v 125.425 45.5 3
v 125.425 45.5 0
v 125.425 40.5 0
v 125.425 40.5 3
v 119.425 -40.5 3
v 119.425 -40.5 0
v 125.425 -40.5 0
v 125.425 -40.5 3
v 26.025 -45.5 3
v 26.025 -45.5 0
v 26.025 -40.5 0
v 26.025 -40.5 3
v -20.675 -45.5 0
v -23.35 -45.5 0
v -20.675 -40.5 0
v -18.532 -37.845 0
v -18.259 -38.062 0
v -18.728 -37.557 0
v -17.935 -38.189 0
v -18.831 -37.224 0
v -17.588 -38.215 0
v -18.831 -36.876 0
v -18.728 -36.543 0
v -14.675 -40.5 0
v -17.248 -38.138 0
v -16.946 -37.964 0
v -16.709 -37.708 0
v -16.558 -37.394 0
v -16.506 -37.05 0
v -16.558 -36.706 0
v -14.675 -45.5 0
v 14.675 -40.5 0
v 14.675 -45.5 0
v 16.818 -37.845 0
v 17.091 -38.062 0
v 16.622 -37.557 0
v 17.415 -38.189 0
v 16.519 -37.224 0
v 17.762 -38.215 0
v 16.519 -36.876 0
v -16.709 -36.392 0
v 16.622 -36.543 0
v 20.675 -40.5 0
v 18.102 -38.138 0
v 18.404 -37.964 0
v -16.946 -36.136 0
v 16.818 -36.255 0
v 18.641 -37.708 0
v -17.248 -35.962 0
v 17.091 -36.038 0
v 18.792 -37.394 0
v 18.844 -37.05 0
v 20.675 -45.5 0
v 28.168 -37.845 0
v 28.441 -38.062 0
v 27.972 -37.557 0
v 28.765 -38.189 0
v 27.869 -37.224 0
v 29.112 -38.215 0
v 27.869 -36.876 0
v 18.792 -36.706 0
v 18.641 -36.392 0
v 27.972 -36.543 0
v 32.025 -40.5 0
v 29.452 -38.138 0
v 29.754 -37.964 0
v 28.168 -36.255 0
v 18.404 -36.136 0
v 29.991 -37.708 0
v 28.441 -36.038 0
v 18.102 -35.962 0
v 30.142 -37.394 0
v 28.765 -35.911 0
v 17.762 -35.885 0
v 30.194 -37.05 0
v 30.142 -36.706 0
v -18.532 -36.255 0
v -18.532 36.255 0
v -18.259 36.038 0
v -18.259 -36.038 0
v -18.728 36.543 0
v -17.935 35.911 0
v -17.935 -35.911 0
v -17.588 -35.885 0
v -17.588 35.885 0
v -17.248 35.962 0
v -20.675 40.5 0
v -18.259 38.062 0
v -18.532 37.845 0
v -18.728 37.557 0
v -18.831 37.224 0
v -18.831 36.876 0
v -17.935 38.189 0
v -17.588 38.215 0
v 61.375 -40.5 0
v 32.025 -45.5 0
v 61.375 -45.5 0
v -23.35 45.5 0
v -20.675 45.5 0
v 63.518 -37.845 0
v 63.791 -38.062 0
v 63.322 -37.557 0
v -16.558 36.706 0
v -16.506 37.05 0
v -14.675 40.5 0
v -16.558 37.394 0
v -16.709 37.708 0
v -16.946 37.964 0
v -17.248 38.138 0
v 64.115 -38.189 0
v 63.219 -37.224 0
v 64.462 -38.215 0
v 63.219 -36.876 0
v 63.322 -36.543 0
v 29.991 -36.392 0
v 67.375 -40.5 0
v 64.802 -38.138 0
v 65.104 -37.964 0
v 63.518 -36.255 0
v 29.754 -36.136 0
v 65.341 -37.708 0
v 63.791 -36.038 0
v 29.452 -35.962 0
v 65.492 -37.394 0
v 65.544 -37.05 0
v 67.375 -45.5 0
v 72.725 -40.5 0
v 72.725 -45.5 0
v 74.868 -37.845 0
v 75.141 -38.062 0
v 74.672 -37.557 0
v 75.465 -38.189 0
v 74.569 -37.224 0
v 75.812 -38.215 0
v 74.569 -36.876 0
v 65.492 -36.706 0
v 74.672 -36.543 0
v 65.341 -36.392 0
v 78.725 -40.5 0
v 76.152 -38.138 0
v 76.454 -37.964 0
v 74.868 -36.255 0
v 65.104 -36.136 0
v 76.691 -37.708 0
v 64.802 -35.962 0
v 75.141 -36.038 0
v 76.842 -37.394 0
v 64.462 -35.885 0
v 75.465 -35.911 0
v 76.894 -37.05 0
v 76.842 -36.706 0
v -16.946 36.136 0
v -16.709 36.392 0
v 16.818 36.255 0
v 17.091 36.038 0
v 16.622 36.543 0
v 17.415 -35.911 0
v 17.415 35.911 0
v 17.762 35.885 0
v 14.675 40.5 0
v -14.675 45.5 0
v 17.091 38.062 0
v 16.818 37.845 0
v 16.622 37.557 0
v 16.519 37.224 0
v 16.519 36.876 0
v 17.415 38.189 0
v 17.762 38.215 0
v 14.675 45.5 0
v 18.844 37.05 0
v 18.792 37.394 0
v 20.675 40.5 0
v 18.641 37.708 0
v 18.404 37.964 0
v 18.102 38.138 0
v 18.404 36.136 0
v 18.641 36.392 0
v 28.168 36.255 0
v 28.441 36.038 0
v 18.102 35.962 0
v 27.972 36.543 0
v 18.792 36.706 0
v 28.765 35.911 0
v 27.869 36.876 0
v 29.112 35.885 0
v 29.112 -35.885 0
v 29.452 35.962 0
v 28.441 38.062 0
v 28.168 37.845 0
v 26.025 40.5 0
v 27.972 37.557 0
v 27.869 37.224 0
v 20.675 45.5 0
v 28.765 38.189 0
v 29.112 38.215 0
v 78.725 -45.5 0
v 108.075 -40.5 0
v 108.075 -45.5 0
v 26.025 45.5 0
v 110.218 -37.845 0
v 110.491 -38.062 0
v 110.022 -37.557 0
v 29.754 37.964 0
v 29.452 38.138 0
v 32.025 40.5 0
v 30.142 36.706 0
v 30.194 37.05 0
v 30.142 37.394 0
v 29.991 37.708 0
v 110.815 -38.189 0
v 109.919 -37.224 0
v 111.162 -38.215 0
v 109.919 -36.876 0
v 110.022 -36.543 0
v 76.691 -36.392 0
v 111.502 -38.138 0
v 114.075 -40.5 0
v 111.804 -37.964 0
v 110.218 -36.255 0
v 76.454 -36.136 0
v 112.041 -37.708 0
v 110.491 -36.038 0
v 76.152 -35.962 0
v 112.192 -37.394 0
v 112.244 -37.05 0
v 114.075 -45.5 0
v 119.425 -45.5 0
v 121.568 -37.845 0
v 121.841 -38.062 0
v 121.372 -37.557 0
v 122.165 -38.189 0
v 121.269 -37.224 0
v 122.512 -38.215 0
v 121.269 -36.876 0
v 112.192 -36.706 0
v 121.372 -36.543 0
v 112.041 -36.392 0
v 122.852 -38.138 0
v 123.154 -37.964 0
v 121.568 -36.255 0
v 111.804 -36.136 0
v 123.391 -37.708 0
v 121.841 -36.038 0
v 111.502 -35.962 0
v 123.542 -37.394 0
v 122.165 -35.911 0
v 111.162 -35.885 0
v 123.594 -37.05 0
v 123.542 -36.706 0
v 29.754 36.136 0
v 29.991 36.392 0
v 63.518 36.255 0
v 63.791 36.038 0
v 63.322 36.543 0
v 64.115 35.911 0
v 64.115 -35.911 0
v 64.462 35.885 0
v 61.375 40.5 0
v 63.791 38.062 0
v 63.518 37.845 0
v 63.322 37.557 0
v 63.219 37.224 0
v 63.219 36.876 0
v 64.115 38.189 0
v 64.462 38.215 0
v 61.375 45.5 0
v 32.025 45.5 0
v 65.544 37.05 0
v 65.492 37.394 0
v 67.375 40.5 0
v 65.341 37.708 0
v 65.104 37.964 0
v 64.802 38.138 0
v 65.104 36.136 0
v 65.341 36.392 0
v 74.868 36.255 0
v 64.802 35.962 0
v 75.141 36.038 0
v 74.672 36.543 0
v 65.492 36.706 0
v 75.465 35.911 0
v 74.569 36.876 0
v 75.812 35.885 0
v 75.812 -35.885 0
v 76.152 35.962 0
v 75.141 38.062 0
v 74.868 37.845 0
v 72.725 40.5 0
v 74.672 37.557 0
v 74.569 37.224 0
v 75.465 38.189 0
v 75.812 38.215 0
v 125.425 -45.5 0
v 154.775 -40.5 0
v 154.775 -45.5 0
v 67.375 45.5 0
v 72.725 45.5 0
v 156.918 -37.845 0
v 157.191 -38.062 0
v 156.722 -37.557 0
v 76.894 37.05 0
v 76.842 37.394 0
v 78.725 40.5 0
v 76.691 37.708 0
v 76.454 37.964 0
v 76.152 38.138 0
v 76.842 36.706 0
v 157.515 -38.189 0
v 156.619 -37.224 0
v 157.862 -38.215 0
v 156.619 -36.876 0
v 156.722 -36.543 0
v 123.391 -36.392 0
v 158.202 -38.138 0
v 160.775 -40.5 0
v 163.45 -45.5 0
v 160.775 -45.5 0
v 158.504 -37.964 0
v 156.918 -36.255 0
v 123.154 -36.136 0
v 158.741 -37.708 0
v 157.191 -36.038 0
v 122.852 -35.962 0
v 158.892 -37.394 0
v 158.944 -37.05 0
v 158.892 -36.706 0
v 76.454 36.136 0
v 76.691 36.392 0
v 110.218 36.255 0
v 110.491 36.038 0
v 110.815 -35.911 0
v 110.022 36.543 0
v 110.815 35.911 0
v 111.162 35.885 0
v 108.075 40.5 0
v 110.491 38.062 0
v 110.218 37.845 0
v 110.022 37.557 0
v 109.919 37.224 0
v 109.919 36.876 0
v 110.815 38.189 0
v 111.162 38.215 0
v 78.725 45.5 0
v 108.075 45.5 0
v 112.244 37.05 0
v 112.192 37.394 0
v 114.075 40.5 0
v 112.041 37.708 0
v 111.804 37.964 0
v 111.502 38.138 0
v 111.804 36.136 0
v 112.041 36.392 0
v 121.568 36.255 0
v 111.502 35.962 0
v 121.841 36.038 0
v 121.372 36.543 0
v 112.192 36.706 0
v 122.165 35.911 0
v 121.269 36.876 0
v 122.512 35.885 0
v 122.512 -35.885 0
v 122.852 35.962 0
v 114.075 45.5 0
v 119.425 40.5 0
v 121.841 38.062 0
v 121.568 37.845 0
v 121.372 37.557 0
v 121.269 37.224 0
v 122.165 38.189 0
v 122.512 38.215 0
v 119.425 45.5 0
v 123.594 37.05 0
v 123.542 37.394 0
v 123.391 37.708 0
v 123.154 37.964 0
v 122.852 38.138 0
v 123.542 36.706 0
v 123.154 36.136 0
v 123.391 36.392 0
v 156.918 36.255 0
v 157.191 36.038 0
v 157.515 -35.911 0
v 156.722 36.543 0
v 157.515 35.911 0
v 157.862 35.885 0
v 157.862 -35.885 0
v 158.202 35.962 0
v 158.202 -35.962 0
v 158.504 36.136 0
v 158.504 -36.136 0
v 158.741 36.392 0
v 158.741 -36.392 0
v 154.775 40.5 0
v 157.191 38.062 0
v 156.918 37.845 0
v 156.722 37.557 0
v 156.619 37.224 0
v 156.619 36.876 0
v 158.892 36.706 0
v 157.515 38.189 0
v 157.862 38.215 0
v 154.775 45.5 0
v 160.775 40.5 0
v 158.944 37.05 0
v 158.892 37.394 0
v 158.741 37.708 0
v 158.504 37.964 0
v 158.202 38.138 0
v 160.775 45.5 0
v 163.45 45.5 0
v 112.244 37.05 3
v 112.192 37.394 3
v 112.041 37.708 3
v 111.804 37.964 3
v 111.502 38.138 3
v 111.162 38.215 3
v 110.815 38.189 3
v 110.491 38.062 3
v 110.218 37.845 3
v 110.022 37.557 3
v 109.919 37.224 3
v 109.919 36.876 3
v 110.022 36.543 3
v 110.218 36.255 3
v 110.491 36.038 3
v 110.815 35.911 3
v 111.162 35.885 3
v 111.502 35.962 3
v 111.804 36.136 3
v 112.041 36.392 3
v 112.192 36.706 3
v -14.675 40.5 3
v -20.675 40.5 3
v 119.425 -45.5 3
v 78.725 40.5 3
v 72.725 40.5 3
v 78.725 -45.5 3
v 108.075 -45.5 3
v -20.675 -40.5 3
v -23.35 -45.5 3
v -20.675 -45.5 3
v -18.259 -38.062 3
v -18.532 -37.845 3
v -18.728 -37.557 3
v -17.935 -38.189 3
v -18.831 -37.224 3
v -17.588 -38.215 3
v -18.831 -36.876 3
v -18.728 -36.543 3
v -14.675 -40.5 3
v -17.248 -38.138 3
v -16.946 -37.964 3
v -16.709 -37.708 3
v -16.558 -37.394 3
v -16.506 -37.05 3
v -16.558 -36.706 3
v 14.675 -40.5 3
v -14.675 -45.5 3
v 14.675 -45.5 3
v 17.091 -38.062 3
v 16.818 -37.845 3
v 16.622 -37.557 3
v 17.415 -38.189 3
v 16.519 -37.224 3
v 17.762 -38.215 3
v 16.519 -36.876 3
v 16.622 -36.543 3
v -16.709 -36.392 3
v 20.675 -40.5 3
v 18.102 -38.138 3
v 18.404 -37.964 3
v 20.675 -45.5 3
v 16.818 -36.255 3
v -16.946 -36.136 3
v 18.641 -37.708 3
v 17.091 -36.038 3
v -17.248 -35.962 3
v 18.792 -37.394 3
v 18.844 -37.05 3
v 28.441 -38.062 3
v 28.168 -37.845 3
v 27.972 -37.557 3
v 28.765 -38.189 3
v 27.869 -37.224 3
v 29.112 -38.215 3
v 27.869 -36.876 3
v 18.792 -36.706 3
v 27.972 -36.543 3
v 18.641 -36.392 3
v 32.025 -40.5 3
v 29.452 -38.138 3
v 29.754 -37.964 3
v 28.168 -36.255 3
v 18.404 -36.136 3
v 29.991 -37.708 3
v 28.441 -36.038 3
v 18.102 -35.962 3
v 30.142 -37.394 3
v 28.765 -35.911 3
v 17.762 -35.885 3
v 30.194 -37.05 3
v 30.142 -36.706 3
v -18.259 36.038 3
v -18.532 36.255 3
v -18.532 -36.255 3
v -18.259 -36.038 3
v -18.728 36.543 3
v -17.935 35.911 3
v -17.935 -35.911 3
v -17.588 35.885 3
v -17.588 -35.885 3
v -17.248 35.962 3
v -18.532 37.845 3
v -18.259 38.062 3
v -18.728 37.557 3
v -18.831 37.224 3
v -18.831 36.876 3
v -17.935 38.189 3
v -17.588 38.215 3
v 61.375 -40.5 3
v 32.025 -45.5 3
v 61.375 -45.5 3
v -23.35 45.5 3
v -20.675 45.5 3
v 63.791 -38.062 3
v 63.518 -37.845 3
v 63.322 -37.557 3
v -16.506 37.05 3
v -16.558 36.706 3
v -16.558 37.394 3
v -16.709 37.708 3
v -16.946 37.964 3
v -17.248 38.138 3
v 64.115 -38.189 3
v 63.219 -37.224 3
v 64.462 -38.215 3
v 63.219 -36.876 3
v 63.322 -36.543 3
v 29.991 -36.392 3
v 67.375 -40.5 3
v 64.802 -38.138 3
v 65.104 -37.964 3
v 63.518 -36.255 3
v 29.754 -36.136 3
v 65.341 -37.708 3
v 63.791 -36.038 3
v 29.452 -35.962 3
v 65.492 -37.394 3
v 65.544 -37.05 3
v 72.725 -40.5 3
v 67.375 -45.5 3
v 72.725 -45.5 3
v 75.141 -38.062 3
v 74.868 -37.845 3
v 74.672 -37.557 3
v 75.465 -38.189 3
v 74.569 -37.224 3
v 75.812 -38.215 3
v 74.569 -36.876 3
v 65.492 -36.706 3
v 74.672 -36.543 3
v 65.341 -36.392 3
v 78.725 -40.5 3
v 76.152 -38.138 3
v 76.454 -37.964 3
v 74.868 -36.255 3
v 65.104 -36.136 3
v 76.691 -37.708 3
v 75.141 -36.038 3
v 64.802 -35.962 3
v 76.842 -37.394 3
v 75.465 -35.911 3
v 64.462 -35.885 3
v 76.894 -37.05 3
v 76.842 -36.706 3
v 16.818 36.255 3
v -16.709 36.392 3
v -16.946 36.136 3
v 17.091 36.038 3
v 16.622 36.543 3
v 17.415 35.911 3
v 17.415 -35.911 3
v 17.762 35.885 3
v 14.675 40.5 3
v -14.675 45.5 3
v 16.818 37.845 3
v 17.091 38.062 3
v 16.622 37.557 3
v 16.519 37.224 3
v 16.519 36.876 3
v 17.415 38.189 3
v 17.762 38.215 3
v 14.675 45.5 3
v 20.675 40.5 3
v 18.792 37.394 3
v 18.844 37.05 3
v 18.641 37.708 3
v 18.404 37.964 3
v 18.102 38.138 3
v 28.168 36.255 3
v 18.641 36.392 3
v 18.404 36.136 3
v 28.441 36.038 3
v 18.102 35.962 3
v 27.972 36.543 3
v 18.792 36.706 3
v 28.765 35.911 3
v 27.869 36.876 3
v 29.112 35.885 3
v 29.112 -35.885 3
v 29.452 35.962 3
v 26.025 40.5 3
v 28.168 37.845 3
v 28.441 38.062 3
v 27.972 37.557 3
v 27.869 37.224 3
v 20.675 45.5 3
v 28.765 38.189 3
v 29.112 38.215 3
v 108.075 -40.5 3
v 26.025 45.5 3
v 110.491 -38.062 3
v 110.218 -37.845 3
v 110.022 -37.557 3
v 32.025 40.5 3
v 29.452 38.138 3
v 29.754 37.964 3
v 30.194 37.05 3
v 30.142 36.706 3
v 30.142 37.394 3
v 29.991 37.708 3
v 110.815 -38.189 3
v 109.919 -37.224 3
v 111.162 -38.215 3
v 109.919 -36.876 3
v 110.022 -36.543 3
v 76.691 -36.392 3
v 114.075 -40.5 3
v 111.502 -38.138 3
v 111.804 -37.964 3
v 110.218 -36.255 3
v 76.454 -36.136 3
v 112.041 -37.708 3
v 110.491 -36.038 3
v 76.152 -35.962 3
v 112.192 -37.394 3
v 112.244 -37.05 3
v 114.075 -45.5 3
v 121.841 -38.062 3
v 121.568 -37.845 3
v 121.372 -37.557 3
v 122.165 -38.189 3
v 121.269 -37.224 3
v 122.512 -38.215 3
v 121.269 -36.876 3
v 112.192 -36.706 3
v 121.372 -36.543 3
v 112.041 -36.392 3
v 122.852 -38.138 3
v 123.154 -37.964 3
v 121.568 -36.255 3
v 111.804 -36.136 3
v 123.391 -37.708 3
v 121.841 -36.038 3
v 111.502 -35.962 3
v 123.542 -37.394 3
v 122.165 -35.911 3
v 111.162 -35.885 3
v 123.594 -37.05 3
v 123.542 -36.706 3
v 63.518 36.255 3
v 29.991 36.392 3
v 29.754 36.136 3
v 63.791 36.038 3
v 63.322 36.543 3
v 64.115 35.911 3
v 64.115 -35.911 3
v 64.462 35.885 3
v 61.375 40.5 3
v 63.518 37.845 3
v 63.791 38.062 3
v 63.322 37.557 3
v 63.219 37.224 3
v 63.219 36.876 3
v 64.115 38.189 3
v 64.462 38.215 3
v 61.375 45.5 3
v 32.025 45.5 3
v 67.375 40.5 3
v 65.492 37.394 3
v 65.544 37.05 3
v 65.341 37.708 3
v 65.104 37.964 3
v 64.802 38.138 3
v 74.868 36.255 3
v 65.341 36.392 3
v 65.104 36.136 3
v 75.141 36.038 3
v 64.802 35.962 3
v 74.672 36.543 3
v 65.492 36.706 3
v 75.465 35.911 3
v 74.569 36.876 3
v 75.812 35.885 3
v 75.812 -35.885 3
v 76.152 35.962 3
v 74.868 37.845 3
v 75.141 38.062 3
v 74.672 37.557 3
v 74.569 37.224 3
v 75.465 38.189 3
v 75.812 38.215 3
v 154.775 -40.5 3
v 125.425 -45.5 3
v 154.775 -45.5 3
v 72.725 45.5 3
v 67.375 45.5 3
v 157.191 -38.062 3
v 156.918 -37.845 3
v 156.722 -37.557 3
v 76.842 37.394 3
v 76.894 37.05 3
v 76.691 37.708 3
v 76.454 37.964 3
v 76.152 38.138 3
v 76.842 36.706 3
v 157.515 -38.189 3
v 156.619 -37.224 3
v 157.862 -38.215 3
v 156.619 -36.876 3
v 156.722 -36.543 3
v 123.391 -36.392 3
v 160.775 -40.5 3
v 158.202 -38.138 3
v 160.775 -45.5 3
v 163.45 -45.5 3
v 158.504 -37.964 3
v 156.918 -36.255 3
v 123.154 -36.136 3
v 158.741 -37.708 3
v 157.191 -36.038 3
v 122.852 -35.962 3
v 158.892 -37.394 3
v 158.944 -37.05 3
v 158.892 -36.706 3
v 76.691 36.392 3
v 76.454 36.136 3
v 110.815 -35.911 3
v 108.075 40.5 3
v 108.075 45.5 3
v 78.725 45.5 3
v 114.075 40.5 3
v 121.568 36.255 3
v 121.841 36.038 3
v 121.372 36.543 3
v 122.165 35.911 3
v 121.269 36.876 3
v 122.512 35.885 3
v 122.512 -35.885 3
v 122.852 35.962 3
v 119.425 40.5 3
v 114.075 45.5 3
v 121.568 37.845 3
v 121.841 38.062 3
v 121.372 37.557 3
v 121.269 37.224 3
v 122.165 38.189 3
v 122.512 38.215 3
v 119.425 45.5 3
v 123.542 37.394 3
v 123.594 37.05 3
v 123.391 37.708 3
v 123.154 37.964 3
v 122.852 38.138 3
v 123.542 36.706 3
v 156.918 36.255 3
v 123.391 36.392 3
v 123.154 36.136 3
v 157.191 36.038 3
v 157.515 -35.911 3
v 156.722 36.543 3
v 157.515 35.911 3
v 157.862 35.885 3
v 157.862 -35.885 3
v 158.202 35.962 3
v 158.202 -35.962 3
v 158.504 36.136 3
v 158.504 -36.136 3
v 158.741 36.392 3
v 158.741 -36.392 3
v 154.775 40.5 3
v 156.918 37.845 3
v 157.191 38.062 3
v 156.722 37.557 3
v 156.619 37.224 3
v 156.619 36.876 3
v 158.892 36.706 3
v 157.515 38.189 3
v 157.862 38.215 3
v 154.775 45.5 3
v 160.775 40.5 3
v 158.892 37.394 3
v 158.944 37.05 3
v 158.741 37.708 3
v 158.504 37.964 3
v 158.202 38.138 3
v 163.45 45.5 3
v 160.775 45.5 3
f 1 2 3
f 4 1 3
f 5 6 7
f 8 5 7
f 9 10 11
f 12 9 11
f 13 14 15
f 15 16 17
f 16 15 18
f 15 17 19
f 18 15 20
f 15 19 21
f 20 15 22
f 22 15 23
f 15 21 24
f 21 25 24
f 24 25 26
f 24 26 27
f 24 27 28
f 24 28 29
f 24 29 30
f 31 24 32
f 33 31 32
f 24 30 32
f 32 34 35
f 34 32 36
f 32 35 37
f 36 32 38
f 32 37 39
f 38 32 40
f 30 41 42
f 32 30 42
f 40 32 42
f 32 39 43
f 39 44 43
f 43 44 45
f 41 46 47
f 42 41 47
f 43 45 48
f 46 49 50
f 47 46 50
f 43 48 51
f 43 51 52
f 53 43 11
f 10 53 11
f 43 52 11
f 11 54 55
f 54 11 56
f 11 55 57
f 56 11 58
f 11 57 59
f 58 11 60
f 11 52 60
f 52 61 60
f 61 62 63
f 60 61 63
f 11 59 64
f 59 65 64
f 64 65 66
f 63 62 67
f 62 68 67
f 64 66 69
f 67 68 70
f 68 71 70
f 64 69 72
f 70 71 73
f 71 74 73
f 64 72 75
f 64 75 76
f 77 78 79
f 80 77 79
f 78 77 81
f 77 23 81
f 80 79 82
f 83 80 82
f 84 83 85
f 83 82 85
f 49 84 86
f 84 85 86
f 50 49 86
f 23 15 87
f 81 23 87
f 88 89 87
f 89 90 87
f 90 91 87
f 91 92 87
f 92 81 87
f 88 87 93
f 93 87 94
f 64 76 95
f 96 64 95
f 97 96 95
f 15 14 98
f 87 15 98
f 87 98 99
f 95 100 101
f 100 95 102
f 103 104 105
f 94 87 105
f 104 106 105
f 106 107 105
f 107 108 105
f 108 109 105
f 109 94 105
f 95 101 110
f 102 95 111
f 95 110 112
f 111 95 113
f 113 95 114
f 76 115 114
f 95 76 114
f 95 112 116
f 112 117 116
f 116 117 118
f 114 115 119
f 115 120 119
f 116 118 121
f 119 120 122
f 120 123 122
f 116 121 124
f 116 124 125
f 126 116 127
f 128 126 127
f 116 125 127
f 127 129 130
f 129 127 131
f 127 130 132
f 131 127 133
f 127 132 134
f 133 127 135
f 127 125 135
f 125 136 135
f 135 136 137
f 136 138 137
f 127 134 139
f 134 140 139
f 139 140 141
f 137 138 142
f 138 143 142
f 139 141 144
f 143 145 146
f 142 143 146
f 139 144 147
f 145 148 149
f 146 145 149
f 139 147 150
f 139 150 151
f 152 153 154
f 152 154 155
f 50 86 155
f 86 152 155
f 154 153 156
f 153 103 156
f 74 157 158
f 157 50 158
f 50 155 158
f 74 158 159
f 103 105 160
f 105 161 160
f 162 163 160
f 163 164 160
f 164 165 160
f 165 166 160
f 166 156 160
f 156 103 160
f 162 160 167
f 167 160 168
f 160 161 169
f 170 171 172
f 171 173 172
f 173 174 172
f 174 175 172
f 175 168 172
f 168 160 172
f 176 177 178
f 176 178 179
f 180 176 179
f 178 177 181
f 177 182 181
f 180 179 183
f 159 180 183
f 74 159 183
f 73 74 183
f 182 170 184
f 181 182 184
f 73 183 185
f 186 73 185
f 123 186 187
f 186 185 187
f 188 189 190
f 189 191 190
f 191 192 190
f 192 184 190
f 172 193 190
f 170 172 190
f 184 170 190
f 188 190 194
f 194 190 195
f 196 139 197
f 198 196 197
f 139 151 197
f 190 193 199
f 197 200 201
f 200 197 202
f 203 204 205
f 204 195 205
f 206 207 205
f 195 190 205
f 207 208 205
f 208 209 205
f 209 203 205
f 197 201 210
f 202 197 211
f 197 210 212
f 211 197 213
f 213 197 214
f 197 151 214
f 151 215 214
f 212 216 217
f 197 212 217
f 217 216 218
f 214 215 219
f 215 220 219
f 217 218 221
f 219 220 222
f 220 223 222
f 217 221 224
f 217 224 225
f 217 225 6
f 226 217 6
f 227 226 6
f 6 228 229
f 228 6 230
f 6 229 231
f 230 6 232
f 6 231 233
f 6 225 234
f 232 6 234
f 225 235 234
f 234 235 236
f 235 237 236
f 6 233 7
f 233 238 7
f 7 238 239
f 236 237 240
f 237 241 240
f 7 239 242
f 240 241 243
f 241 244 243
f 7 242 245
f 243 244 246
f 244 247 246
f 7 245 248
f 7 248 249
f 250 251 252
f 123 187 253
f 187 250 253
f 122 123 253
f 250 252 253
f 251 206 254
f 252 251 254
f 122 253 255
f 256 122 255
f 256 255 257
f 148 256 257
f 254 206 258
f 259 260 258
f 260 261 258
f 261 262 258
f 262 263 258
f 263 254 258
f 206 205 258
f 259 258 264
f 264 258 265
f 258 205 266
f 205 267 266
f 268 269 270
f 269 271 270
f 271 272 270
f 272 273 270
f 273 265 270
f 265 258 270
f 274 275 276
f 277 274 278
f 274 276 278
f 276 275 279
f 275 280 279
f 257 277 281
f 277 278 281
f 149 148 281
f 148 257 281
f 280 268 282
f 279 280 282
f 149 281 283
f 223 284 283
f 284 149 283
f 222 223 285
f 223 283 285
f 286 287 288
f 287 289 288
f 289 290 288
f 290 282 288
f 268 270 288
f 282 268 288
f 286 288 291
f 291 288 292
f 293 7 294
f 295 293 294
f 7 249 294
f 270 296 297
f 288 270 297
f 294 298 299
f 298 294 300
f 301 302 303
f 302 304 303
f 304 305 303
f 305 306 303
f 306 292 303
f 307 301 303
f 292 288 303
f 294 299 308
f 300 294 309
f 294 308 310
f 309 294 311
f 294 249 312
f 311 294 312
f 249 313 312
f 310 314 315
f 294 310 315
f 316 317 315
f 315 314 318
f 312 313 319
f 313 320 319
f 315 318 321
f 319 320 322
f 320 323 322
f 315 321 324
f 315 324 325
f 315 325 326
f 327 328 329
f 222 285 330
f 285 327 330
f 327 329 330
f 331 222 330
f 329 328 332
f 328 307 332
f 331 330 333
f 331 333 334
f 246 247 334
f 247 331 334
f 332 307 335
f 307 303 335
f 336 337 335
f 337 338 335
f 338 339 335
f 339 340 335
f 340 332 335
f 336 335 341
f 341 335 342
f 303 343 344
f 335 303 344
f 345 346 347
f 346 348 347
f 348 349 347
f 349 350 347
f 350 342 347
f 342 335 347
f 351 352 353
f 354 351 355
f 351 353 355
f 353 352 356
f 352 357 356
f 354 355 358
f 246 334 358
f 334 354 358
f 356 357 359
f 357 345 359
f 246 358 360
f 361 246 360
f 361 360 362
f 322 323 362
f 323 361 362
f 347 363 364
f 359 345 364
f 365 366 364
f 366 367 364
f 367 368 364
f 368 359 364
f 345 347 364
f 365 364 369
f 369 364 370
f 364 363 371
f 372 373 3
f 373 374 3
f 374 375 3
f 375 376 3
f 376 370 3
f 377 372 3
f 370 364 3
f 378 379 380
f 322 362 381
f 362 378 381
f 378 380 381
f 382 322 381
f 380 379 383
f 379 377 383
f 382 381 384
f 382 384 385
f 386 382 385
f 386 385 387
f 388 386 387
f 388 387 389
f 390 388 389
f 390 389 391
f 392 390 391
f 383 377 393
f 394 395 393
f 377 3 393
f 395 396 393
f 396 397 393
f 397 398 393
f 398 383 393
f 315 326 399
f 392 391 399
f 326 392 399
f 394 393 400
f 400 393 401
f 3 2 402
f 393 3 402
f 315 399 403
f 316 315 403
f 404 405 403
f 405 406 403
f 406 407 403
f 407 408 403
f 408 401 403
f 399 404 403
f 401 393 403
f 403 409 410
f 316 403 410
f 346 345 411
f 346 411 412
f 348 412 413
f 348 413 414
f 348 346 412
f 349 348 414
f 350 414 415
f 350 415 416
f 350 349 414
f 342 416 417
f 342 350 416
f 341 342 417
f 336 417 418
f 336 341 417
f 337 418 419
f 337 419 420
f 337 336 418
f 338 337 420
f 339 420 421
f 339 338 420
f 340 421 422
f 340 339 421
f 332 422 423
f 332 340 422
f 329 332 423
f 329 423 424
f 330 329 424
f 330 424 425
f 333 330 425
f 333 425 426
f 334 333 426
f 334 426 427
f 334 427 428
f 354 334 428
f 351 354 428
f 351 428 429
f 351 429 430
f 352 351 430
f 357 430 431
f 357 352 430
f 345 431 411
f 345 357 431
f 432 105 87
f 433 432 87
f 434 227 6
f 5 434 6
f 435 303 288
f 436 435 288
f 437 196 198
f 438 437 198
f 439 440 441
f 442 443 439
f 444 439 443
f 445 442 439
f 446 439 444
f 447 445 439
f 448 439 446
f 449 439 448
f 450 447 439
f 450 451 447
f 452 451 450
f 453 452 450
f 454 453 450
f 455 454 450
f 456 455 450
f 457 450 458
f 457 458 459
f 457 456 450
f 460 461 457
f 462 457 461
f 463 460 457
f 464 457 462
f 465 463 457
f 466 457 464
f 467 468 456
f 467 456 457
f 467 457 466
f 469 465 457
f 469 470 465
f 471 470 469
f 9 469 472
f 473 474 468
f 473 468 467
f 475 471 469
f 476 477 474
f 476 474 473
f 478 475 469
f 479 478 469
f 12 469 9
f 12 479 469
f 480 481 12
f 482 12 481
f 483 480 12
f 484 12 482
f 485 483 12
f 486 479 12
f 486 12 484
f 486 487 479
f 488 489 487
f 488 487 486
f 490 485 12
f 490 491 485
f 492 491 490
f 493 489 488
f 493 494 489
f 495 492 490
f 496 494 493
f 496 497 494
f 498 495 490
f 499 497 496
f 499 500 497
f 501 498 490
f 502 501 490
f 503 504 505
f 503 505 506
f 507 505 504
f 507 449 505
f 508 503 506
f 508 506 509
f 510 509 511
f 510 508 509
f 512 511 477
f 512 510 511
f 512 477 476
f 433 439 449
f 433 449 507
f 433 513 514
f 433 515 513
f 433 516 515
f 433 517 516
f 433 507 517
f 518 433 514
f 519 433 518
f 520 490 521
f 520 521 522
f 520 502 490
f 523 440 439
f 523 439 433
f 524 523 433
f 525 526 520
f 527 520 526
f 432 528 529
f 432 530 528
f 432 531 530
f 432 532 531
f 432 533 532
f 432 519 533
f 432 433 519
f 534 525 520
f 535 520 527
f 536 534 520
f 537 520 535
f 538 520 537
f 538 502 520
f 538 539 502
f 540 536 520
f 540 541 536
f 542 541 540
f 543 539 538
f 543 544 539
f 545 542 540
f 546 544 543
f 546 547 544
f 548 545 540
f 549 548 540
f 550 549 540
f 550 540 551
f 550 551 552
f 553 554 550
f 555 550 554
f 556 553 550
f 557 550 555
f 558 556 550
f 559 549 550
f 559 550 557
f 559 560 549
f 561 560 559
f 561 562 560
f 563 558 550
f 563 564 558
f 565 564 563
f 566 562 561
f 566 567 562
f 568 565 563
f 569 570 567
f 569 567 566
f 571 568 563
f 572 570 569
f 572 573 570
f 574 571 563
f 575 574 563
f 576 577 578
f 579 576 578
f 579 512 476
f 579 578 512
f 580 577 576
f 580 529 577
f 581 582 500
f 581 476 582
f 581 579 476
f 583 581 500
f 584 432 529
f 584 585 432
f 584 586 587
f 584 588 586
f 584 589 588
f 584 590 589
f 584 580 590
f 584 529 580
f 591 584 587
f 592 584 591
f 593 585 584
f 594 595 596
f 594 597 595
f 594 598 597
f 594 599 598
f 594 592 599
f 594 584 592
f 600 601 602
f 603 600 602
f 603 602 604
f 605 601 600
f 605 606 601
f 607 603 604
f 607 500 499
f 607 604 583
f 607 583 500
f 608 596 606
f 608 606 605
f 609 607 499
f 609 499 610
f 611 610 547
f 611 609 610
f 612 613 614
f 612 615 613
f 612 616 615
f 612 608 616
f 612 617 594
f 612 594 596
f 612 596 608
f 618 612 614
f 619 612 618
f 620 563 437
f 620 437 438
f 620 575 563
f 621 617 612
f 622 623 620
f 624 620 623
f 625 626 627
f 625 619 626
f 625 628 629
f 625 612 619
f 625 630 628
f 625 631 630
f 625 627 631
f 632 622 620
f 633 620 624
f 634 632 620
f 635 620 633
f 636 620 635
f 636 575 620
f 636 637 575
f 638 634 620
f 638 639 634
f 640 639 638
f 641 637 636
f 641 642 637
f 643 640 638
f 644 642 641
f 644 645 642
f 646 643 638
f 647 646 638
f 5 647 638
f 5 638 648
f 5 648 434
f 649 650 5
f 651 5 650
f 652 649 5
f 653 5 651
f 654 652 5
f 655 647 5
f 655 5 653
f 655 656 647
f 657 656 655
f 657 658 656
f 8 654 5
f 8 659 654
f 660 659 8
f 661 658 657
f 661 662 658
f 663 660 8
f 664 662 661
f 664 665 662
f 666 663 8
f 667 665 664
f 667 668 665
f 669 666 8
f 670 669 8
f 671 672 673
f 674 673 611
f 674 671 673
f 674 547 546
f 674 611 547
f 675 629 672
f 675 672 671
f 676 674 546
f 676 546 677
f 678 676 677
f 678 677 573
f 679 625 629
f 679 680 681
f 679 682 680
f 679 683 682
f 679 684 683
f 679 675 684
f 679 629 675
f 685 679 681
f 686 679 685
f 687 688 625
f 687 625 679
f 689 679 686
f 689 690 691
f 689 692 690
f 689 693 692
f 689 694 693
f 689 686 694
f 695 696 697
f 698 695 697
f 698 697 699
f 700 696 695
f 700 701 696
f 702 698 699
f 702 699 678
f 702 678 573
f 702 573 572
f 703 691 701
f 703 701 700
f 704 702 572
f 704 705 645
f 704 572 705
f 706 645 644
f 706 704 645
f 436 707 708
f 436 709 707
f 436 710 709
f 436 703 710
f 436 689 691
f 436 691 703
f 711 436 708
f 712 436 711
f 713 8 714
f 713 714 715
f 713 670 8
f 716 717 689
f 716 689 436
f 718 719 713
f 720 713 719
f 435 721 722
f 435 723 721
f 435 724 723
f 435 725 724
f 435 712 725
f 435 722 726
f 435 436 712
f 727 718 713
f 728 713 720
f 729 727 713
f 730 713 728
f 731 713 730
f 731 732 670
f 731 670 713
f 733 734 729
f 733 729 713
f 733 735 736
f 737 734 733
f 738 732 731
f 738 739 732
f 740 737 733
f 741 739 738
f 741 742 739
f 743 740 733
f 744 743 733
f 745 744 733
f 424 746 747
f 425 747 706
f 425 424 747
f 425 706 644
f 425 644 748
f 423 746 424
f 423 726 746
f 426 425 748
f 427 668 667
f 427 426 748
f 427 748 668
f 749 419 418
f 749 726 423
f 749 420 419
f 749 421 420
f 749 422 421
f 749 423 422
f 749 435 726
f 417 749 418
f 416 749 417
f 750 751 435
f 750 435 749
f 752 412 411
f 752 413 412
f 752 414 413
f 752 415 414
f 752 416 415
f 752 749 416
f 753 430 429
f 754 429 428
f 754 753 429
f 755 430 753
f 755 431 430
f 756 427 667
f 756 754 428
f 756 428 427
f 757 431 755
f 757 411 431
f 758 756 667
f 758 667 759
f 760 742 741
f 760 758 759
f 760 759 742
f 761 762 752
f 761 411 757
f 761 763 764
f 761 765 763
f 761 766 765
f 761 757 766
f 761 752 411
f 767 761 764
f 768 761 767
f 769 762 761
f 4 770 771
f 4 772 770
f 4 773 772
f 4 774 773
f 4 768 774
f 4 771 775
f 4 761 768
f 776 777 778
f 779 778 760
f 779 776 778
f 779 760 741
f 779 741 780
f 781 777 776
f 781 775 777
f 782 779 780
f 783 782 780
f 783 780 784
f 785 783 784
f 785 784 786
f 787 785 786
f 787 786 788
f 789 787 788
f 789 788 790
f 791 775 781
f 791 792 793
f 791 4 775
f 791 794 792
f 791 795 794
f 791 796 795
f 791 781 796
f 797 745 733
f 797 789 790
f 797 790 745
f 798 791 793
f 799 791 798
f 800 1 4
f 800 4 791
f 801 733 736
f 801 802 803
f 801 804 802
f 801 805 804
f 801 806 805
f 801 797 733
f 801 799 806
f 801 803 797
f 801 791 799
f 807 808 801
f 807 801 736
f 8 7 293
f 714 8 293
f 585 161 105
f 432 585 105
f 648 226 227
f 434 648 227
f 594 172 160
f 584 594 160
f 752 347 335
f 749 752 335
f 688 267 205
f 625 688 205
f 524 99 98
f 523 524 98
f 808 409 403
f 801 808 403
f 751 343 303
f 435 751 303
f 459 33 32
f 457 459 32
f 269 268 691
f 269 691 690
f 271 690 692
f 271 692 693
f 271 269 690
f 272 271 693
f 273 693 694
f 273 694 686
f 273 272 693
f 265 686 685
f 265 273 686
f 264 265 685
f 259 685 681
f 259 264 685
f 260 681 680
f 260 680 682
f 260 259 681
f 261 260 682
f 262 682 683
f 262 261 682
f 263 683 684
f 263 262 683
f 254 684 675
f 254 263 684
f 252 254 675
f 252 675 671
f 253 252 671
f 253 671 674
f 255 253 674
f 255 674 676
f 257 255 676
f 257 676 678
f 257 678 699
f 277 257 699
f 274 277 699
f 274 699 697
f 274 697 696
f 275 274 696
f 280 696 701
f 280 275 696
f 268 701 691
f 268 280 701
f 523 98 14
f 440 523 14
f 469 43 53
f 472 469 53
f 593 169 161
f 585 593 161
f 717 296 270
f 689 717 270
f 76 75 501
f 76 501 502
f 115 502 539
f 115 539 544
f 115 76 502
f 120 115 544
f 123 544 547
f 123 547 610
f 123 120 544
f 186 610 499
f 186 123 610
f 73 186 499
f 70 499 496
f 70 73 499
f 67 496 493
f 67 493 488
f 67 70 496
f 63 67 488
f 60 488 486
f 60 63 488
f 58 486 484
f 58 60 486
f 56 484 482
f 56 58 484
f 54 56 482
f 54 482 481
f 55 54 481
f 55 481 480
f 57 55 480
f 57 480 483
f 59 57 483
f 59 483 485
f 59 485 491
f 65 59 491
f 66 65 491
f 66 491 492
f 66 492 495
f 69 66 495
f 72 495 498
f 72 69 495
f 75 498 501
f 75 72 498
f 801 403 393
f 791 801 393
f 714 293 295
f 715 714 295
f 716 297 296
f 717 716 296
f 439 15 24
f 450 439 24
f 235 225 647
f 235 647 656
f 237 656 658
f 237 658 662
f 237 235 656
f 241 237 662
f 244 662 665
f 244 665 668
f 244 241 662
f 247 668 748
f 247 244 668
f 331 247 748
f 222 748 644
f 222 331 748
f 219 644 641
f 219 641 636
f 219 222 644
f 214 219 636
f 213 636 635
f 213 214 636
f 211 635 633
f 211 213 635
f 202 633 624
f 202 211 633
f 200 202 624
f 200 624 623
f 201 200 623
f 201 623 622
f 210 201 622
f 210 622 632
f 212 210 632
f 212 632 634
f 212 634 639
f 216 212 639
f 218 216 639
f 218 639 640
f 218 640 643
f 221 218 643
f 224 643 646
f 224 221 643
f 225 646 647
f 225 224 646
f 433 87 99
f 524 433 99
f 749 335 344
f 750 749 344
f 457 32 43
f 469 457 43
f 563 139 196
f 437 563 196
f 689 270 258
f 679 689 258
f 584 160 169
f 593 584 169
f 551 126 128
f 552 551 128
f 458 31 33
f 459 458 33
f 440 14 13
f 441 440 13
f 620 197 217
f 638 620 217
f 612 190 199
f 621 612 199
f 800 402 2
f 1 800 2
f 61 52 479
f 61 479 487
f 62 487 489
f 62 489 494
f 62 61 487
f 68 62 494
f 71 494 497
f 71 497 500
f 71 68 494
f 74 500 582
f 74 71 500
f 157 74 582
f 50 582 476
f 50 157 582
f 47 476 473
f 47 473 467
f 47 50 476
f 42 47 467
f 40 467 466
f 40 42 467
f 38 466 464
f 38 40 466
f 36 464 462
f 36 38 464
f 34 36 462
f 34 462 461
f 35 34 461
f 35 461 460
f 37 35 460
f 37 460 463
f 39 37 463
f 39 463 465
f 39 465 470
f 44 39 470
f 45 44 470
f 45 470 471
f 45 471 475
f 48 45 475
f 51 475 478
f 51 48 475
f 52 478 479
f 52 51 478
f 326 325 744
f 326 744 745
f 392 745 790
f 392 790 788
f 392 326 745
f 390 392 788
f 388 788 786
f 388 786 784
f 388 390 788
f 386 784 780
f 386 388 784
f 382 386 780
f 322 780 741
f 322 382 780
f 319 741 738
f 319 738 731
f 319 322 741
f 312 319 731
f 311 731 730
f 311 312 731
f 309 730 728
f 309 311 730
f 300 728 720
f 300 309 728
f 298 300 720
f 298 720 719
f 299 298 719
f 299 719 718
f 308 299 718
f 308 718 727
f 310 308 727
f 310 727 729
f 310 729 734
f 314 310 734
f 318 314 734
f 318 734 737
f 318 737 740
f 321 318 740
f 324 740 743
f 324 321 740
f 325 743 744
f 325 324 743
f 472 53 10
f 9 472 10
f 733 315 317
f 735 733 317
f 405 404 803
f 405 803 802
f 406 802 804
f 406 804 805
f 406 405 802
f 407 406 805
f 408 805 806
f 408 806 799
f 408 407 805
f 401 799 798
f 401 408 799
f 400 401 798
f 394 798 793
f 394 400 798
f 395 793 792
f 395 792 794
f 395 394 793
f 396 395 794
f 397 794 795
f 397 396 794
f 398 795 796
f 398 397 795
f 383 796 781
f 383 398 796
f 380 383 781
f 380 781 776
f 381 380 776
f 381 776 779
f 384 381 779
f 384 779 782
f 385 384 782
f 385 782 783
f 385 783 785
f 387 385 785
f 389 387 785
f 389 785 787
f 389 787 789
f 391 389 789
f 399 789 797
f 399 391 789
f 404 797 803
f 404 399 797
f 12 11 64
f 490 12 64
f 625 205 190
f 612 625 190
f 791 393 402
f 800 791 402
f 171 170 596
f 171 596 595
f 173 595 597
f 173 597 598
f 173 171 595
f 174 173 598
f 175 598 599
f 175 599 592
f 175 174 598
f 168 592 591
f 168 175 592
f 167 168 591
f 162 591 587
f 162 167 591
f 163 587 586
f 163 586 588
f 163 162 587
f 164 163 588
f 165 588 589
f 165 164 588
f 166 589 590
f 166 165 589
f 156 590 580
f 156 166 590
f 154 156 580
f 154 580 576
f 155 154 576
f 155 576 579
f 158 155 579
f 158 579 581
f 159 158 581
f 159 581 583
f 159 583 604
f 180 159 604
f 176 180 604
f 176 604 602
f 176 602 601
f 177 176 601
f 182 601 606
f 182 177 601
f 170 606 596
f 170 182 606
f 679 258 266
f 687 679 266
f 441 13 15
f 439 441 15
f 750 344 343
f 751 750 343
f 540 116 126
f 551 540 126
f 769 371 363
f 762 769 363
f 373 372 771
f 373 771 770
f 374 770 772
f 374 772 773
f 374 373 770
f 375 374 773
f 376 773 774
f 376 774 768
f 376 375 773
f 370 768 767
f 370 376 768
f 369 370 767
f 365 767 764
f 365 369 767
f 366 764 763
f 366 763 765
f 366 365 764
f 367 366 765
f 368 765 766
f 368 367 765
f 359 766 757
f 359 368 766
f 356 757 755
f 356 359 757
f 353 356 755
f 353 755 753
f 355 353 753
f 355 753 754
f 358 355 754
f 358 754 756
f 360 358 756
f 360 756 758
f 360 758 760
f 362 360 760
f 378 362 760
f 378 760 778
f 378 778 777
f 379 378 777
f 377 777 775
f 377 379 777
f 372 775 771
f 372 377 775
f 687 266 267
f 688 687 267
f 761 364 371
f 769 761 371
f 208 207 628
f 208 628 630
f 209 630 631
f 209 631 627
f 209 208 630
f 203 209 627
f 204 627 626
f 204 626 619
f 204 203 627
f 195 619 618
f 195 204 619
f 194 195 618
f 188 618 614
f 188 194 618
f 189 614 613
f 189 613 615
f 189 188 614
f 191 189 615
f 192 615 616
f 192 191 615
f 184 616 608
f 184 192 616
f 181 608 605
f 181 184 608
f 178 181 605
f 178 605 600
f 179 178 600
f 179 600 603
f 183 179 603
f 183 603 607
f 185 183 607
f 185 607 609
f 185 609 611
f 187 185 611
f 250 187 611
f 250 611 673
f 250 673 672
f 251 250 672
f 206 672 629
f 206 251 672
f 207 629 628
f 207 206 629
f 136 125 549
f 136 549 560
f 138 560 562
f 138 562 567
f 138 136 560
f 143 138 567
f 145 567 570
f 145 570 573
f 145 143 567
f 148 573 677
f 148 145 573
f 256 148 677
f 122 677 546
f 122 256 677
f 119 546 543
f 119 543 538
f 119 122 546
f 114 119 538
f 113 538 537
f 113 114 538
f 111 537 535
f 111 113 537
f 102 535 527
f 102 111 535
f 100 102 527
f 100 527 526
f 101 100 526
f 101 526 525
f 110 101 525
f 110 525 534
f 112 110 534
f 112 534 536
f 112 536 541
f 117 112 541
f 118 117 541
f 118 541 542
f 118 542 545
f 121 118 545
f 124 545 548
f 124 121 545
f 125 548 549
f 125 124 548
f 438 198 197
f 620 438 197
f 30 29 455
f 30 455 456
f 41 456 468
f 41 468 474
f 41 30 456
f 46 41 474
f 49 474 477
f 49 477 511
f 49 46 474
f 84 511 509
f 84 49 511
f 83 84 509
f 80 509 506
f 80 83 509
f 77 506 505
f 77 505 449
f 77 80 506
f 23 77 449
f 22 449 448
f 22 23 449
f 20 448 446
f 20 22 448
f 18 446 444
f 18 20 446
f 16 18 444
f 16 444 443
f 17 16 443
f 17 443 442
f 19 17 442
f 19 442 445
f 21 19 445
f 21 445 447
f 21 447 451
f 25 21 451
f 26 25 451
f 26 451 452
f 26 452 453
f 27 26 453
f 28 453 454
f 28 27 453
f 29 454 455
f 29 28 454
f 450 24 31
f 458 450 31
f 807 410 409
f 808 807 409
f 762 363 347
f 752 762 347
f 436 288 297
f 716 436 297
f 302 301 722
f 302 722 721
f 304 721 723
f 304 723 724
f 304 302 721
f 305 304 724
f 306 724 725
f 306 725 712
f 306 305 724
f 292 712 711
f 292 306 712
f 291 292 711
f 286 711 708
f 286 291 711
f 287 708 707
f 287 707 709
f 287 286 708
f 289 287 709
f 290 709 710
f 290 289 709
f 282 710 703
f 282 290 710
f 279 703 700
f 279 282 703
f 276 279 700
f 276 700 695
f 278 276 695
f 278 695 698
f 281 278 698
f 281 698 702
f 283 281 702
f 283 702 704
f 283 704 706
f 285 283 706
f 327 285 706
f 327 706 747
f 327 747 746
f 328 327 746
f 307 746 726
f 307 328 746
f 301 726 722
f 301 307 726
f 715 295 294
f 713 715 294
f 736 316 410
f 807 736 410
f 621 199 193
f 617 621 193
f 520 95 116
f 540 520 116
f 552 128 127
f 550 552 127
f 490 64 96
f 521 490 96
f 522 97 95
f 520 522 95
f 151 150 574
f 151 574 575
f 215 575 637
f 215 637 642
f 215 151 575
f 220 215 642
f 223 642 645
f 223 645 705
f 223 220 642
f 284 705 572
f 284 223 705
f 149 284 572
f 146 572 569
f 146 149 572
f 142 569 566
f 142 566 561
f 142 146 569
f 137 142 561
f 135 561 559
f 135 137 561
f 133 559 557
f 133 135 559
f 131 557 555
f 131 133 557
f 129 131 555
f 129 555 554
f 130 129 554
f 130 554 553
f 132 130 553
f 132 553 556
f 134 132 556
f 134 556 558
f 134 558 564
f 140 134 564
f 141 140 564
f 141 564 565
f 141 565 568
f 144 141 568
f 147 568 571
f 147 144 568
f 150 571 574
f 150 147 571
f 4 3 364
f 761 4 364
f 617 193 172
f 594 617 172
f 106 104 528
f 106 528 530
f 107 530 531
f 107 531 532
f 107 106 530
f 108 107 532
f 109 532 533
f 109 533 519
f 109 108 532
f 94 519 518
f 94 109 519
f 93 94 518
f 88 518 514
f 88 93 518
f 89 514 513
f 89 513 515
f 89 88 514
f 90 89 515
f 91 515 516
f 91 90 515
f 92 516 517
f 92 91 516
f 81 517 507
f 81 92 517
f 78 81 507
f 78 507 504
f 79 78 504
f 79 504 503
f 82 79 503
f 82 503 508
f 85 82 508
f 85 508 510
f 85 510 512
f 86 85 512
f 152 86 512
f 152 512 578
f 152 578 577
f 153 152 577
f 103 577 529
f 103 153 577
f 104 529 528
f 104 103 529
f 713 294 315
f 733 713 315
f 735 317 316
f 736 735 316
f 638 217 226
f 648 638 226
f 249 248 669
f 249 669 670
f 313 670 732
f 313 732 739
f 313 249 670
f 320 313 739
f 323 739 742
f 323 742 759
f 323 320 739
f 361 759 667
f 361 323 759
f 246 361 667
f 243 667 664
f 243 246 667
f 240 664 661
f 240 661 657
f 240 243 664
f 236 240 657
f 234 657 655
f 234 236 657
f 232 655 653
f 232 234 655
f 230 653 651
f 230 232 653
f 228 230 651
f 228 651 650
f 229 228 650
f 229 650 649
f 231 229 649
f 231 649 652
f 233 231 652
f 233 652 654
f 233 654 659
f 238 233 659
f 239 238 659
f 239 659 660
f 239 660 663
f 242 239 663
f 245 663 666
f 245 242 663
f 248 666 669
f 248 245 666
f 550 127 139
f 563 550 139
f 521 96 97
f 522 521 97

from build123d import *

# Parameters (mm, degrees)
SKETCH1_R           = 1.168758958
BOSS_EXTRUDE1_DEPTH = 3


with BuildPart() as part:
    # Sketch1 → Boss-Extrude1 (new body)
    # profile 1 of 4: a face of its own
    with BuildSketch(Plane.XY):
        Polygon((26.025, 45.5), (23.35, 45.5), (23.35, -45.5), (26.025, -45.5), (26.025, -40.5), (32.025, -40.5), (32.025, -45.5), (61.375, -45.5), (61.375, -40.5), (67.375, -40.5), (67.375, -45.5), (70.05, -45.5), (70.05, 45.5), (67.375, 45.5), (67.375, 40.5), (61.375, 40.5), (61.375, 45.5), (32.025, 45.5), (32.025, 40.5), (26.025, 40.5), align=None)
        with Locations((29.025, -37.05)):
            Circle(SKETCH1_R, mode=Mode.SUBTRACT)
        with Locations((64.375, -37.05)):
            Circle(SKETCH1_R, mode=Mode.SUBTRACT)
        with Locations((29.025, 37.05)):
            Circle(SKETCH1_R, mode=Mode.SUBTRACT)
        with Locations((64.375, 37.05)):
            Circle(SKETCH1_R, mode=Mode.SUBTRACT)
    # profile 2 of 4: a face of its own
    with BuildSketch(Plane.XY):
        Polygon((-20.675, 45.5), (-23.35, 45.5), (-23.35, -45.5), (-20.675, -45.5), (-20.675, -40.5), (-14.675, -40.5), (-14.675, -45.5), (14.675, -45.5), (14.675, -40.5), (20.675, -40.5), (20.675, -45.5), (23.35, -45.5), (23.35, 45.5), (20.675, 45.5), (20.675, 40.5), (14.675, 40.5), (14.675, 45.5), (-14.675, 45.5), (-14.675, 40.5), (-20.675, 40.5), align=None)
        with Locations((-17.675, -37.05)):
            Circle(SKETCH1_R, mode=Mode.SUBTRACT)
        with Locations((17.675, -37.05)):
            Circle(SKETCH1_R, mode=Mode.SUBTRACT)
        with Locations((-17.675, 37.05)):
            Circle(SKETCH1_R, mode=Mode.SUBTRACT)
        with Locations((17.675, 37.05)):
            Circle(SKETCH1_R, mode=Mode.SUBTRACT)
    # profile 3 of 4: a face of its own
    with BuildSketch(Plane.XY):
        Polygon((72.725, 45.5), (70.05, 45.5), (70.05, -45.5), (72.725, -45.5), (72.725, -40.5), (78.725, -40.5), (78.725, -45.5), (108.075, -45.5), (108.075, -40.5), (114.075, -40.5), (114.075, -45.5), (116.75, -45.5), (116.75, 45.5), (114.075, 45.5), (114.075, 40.5), (108.075, 40.5), (108.075, 45.5), (78.725, 45.5), (78.725, 40.5), (72.725, 40.5), align=None)
        with Locations((75.725, -37.05)):
            Circle(SKETCH1_R, mode=Mode.SUBTRACT)
        with Locations((111.075, -37.05)):
            Circle(SKETCH1_R, mode=Mode.SUBTRACT)
        with Locations((75.725, 37.05)):
            Circle(SKETCH1_R, mode=Mode.SUBTRACT)
        with Locations((111.075, 37.05)):
            Circle(SKETCH1_R, mode=Mode.SUBTRACT)
    # profile 4 of 4: a face of its own
    with BuildSketch(Plane.XY):
        Polygon((119.425, 45.5), (116.75, 45.5), (116.75, -45.5), (119.425, -45.5), (119.425, -40.5), (125.425, -40.5), (125.425, -45.5), (154.775, -45.5), (154.775, -40.5), (160.775, -40.5), (160.775, -45.5), (163.45, -45.5), (163.45, 45.5), (160.775, 45.5), (160.775, 40.5), (154.775, 40.5), (154.775, 45.5), (125.425, 45.5), (125.425, 40.5), (119.425, 40.5), align=None)
        with Locations((122.425, -37.05)):
            Circle(SKETCH1_R, mode=Mode.SUBTRACT)
        with Locations((157.775, -37.05)):
            Circle(SKETCH1_R, mode=Mode.SUBTRACT)
        with Locations((122.425, 37.05)):
            Circle(SKETCH1_R, mode=Mode.SUBTRACT)
        with Locations((157.775, 37.05)):
            Circle(SKETCH1_R, mode=Mode.SUBTRACT)
    extrude(amount=BOSS_EXTRUDE1_DEPTH)


solid = part.part
